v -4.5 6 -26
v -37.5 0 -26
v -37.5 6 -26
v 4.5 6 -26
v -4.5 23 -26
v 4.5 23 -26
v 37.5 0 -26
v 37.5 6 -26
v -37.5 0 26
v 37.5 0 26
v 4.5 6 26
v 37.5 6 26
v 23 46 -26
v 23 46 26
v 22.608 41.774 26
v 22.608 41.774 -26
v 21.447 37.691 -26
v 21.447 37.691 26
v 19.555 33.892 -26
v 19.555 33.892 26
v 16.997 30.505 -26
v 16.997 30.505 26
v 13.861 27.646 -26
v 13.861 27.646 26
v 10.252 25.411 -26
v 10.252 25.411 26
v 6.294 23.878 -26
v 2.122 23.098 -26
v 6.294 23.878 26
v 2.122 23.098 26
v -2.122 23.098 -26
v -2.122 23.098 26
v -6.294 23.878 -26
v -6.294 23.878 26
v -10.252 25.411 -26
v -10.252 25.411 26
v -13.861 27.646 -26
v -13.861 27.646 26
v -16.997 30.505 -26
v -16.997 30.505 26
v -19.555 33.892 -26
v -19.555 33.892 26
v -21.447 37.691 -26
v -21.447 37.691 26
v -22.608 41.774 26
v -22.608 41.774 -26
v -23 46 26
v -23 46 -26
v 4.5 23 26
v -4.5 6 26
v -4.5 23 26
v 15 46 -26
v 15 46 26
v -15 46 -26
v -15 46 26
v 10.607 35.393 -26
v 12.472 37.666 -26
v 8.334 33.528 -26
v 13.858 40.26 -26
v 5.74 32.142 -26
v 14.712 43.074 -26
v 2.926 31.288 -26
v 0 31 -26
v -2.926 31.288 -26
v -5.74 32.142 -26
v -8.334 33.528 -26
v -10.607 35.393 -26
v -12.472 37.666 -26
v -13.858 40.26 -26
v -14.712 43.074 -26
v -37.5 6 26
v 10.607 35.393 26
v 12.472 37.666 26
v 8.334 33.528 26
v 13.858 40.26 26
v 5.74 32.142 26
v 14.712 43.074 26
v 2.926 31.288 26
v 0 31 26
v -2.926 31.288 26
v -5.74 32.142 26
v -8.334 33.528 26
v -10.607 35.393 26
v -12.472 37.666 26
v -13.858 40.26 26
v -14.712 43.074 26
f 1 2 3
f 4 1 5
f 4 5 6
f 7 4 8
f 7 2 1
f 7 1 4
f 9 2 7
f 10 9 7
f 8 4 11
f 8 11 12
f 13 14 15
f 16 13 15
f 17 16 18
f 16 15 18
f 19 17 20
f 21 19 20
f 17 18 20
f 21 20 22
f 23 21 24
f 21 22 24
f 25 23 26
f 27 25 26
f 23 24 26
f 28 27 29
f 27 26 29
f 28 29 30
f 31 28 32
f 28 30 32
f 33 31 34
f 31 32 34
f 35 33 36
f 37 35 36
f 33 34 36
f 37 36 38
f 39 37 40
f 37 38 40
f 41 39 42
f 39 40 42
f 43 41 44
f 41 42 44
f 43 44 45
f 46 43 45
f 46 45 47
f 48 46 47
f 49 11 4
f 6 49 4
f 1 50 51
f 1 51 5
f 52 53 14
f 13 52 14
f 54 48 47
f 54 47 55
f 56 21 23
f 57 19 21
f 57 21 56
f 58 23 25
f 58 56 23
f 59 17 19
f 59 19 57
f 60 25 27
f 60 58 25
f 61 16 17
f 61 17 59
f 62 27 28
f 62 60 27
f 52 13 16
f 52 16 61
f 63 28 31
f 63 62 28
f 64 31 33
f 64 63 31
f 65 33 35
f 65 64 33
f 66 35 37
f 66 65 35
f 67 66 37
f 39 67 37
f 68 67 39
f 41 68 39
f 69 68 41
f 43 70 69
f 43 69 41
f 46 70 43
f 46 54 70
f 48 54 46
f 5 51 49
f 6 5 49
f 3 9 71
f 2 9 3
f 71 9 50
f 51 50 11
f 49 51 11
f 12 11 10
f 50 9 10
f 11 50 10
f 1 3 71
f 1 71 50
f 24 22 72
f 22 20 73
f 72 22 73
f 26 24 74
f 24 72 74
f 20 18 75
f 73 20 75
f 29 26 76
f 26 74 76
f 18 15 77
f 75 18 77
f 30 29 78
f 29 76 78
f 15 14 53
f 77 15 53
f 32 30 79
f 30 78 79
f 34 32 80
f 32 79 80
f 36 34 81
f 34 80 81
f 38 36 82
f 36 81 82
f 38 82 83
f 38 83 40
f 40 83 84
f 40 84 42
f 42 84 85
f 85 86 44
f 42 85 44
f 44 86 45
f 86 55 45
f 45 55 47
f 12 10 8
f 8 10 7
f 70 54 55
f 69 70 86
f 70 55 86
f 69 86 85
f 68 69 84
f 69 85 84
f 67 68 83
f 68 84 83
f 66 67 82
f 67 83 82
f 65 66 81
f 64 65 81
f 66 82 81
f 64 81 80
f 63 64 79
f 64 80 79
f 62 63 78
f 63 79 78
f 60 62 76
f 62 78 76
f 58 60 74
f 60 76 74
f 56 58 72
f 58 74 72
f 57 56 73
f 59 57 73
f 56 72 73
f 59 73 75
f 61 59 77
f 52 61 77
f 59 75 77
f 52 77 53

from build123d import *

# Parameters (mm, degrees)
SKETCH1_W           = 75
SKETCH1_H           = 52
BOSS_EXTRUDE1_DEPTH = 6
SKETCH2_W           = 9
SKETCH2_H           = 52
BOSS_EXTRUDE2_DEPTH = 17
BOSS_EXTRUDE3_DEPTH = 52


with BuildPart() as part:
    # Sketch1 → Boss-Extrude1 (new body)
    with BuildSketch(Plane(origin=(0, 0, 0), x_dir=(1, 0, 0), z_dir=(0, 1, 0))):
        Rectangle(SKETCH1_W, SKETCH1_H)
    extrude(amount=BOSS_EXTRUDE1_DEPTH)

    # Sketch2 → Boss-Extrude2 (add)
    with BuildSketch(Plane(origin=(0, 6, 0), x_dir=(1, 0, 0), z_dir=(0, 1, 0))):
        Rectangle(SKETCH2_W, SKETCH2_H)
    extrude(amount=BOSS_EXTRUDE2_DEPTH)


with BuildPart() as body_2:
    # Sketch3 → Boss-Extrude3 (new body)
    with BuildSketch(Plane.XY.offset(26)):
        with BuildLine():
            Line((-23, 46), (-15, 46))
            ThreePointArc((-15, 46), (0, 31), (15, 46))
            Line((15, 46), (23, 46))
            ThreePointArc((23, 46), (0, 23), (-23, 46))
        make_face()
    extrude(amount=-BOSS_EXTRUDE3_DEPTH)


solid = Compound([part.part, body_2.part])
